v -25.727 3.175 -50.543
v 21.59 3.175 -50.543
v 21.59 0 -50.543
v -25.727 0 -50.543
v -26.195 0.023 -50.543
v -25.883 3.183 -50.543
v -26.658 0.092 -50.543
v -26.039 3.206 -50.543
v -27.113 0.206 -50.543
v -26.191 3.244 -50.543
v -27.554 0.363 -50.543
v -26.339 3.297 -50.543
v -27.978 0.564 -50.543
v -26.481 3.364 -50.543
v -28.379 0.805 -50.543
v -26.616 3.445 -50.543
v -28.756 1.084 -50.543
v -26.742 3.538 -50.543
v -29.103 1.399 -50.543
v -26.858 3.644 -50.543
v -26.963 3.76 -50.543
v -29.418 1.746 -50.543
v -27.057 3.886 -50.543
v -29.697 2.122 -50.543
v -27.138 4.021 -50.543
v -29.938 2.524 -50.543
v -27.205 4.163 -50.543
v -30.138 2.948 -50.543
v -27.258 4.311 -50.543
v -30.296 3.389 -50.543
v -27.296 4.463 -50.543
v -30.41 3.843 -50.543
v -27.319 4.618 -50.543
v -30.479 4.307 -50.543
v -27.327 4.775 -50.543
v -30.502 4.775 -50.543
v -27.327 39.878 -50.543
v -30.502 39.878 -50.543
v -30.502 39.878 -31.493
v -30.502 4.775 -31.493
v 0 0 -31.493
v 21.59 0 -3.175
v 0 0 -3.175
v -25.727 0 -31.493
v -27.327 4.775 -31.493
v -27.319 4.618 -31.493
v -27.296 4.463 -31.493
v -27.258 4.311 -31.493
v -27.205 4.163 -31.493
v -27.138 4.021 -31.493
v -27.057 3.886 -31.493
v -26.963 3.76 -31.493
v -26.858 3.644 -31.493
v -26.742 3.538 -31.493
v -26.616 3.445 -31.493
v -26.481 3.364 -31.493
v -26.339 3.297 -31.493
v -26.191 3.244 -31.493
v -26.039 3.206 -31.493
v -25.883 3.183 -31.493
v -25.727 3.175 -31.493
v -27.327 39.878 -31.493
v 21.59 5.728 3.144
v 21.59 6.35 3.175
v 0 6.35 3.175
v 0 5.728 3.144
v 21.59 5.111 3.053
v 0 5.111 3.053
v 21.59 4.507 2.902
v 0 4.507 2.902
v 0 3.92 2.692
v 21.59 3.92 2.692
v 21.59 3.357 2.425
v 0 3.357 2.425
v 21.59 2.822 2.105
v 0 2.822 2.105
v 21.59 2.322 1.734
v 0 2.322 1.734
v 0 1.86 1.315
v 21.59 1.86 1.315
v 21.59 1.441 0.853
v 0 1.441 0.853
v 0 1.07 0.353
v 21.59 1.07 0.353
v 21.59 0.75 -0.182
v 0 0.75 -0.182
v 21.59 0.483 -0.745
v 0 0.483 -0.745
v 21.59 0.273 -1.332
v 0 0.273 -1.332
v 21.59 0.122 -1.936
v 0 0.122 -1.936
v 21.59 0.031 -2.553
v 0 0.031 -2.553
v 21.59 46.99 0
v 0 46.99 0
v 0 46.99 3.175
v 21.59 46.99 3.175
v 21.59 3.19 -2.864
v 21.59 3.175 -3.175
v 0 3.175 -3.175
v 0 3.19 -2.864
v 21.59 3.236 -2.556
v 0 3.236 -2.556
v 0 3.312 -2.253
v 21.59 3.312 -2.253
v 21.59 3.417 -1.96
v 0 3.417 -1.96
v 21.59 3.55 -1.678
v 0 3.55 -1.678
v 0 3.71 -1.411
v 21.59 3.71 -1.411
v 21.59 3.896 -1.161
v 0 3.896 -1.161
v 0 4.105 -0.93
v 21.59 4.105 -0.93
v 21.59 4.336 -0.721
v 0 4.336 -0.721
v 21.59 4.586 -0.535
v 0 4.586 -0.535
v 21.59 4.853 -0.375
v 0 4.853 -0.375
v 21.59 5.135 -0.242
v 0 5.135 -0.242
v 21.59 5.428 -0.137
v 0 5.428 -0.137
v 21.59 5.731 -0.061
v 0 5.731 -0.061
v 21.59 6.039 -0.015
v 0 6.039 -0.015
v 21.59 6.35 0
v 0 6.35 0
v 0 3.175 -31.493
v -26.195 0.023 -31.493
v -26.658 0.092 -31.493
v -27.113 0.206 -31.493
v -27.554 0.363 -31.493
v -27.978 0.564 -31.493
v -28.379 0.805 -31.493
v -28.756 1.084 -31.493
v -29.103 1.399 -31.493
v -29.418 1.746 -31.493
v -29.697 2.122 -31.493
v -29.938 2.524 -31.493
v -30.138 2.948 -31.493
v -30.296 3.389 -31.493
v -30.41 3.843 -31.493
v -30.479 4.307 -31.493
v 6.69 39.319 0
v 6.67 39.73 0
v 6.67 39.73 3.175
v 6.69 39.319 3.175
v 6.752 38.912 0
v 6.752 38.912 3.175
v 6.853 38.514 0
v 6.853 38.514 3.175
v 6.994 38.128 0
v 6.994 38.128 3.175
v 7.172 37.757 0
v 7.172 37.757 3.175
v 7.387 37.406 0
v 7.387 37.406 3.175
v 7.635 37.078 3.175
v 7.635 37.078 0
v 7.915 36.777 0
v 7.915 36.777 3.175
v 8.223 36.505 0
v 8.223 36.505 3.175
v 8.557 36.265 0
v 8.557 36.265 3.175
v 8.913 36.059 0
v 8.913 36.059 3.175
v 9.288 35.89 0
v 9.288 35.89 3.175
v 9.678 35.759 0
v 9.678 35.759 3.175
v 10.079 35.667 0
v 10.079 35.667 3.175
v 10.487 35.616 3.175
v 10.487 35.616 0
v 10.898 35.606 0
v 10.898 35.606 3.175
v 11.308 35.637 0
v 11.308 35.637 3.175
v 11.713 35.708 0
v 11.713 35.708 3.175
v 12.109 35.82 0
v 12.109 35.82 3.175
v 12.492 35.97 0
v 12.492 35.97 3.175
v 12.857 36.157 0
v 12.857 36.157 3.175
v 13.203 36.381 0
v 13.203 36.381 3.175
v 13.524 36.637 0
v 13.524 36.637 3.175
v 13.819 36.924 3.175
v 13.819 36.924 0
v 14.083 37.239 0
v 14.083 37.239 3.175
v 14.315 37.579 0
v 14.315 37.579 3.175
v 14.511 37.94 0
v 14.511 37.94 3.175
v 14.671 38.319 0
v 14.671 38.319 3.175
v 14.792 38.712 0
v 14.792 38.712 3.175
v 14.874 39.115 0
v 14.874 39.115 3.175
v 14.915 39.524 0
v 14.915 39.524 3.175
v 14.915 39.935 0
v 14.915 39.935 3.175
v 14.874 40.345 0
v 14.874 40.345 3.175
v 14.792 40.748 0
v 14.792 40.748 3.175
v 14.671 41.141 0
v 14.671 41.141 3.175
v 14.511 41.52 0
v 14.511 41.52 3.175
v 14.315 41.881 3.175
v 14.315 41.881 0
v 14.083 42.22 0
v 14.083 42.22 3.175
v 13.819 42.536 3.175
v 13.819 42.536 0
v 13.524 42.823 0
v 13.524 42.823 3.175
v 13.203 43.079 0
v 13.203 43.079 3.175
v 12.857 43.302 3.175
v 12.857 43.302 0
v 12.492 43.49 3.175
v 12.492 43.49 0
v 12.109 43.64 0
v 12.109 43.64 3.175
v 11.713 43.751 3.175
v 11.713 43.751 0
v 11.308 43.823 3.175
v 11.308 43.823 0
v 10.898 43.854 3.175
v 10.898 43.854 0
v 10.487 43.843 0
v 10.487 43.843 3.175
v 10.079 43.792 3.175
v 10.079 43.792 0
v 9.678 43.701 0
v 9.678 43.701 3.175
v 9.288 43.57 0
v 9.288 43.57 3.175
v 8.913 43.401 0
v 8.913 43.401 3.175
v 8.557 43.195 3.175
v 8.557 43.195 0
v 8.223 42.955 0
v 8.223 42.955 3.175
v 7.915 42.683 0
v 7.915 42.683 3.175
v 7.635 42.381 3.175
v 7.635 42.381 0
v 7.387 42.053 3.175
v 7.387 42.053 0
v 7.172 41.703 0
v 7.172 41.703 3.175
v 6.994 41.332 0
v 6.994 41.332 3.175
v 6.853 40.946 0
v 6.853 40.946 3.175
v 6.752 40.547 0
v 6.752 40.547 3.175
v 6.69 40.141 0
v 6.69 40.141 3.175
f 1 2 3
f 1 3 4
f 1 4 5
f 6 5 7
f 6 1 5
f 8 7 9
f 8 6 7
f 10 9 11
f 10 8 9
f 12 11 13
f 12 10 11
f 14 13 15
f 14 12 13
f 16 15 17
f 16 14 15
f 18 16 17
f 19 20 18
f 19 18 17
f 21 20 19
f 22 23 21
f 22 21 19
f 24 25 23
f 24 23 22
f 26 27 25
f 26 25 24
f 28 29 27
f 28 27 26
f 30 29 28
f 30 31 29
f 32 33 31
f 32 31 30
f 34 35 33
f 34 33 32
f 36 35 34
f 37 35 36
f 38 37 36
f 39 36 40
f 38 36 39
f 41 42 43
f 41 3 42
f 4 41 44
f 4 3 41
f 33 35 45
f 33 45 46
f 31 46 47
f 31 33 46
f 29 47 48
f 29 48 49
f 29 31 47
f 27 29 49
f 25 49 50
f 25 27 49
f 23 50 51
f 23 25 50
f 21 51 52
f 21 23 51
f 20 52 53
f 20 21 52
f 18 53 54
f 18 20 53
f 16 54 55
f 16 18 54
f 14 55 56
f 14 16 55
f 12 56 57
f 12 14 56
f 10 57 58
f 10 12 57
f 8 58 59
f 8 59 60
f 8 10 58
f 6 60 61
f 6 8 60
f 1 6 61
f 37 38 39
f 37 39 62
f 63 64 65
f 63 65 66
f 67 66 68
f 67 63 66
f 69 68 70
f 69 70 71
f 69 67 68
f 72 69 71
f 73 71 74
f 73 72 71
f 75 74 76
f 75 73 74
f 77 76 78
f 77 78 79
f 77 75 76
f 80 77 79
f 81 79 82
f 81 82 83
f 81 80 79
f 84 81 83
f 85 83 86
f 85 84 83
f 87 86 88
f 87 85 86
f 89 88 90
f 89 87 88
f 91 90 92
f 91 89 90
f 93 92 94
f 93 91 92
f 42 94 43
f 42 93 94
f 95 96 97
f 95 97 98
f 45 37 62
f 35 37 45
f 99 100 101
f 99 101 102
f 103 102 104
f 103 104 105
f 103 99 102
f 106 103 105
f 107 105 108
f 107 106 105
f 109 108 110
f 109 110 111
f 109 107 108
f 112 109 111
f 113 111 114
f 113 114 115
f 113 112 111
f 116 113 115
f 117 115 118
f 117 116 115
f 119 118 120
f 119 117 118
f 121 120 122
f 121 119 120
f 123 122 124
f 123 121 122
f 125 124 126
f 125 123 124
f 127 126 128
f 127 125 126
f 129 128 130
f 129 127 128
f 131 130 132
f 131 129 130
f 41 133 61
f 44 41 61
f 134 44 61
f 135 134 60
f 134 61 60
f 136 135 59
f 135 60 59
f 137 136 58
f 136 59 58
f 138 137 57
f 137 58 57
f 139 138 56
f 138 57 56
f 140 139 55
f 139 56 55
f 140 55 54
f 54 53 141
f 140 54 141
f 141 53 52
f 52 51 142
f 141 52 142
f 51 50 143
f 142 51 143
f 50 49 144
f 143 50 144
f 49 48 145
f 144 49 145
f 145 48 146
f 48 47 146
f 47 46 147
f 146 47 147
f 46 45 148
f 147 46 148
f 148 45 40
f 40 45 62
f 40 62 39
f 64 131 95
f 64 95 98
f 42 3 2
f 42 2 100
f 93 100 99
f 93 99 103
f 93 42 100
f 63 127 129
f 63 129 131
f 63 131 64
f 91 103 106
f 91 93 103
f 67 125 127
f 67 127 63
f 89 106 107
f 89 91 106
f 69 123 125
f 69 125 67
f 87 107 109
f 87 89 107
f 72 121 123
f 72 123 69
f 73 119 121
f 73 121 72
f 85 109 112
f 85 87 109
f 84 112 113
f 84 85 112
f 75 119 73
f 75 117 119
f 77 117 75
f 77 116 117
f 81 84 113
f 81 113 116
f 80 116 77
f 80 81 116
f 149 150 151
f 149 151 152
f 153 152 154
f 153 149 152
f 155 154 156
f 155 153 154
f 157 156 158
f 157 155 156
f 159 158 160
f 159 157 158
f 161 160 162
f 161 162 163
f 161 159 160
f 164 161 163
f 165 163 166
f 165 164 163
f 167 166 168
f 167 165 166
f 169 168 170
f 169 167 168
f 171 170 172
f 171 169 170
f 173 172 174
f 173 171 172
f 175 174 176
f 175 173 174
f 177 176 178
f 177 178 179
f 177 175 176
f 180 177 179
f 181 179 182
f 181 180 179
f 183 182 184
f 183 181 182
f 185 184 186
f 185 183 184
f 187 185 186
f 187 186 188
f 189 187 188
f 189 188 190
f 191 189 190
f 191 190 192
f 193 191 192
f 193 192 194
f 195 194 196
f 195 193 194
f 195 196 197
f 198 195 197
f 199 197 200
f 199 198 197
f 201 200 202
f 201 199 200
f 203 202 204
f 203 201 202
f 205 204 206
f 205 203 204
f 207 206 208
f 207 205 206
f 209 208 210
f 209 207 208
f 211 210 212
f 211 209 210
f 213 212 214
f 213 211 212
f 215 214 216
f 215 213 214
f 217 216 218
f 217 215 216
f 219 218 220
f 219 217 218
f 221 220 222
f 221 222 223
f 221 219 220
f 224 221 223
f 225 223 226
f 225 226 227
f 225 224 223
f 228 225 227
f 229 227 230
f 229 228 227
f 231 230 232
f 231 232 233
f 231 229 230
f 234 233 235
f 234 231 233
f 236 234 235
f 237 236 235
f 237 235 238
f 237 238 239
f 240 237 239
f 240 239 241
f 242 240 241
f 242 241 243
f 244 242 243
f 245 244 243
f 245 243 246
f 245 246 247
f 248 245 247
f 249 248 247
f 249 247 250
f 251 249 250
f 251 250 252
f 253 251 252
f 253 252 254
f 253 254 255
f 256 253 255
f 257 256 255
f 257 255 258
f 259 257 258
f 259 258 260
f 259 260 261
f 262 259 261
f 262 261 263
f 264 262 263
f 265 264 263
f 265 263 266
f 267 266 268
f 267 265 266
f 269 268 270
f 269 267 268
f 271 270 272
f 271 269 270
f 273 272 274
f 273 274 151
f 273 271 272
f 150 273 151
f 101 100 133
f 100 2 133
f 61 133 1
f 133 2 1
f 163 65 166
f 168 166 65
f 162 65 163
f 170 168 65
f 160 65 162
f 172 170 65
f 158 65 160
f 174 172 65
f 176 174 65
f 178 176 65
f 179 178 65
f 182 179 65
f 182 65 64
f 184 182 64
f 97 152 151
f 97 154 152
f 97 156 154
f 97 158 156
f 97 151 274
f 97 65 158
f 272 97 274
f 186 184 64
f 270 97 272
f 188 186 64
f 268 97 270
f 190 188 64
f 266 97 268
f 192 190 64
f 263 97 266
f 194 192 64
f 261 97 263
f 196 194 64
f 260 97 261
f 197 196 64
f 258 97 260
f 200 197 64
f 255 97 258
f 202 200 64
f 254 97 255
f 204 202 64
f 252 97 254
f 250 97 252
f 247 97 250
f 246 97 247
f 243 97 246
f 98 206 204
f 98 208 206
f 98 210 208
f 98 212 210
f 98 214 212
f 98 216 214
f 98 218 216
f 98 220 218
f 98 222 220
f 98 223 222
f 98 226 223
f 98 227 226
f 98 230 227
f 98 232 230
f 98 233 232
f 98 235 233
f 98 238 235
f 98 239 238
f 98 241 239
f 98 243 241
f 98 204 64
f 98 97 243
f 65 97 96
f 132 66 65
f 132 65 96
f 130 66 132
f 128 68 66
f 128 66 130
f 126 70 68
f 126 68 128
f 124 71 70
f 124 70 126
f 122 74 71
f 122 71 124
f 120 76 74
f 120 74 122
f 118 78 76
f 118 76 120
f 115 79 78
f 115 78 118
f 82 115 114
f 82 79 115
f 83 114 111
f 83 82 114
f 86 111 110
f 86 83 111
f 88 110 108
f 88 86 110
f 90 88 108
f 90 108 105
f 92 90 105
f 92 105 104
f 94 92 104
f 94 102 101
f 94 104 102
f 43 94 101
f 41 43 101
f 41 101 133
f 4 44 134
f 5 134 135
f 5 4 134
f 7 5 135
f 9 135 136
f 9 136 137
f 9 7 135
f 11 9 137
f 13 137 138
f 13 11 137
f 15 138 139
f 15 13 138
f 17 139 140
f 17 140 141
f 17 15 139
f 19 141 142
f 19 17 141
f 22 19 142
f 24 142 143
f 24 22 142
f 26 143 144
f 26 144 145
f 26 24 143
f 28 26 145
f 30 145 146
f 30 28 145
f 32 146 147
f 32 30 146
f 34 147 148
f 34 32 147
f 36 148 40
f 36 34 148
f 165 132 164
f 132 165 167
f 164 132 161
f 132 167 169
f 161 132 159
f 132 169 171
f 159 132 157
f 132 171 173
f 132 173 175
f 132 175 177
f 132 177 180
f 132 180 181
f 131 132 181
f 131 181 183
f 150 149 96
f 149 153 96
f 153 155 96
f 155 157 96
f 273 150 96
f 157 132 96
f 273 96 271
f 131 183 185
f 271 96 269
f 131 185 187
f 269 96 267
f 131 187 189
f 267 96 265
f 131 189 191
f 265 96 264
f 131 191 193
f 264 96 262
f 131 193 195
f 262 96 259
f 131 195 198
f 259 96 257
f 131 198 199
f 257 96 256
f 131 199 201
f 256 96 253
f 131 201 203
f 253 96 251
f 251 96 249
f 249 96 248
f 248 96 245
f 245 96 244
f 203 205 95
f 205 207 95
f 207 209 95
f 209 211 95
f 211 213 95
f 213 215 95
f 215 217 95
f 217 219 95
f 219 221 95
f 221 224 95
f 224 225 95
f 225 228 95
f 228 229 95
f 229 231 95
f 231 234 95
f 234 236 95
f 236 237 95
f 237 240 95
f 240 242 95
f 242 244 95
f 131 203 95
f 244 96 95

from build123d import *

# Parameters (mm, degrees)
SKETCH1_W                    = 21.59
SKETCH1_H                    = 46.99
SKETCH1_R                    = 4.124999878
BOSS_EXTRUDE1_DEPTH          = 3.175
EDGE_FLANGE2_STRIP_W         = 19.05
EDGE_FLANGE2_STRIP_H         = 3.175
EDGE_FLANGE2_STRIP_CUT_DEPTH = 21.59
EDGE_FLANGE2_DEPTH           = 21.59
EDGE_FLANGE2_FLAT_DEPTH      = 3.175
EDGE_FLANGE3_STRIP_W         = 15.900000204
EDGE_FLANGE3_STRIP_H         = 3.175
EDGE_FLANGE3_STRIP_CUT_DEPTH = 19.05
EDGE_FLANGE3_DEPTH           = 19.05


# Sheet-metal steps are written as plain solids
with BuildPart() as part:
    # Sketch1 → Boss-Extrude1 (new body)
    with BuildSketch(Plane.XY):
        with Locations((10.795, 23.495)):
            Rectangle(SKETCH1_W, SKETCH1_H)
        with Locations(Location((10.795, 39.729801599, 0), (0, 0, 180))):
            Circle(SKETCH1_R, mode=Mode.SUBTRACT)
    extrude(amount=BOSS_EXTRUDE1_DEPTH)

    # Edge-Flange2 strip (across the edge) → Edge-Flange2 strip cut (cut)
    with BuildSketch(Plane(origin=(21.59, 0, 0), x_dir=(0, 1, 0), z_dir=(-1, 0, 0))):
        with Locations((-3.175, -1.5875)):
            Rectangle(EDGE_FLANGE2_STRIP_W, EDGE_FLANGE2_STRIP_H)
    extrude(amount=EDGE_FLANGE2_STRIP_CUT_DEPTH, mode=Mode.SUBTRACT)

    # Edge-Flange2 bend section (across the edge) → Edge-Flange2 (add)
    with BuildSketch(Plane(origin=(21.59, 0, 0), x_dir=(0, 1, 0), z_dir=(-1, 0, 0))):
        with BuildLine():
            Line((0, 3.175), (3.175, 3.175))
            ThreePointArc((3.175, 3.175), (4.10493597, 0.92993597), (6.35, 0))
            Line((6.35, 0), (6.35, -3.175))
            ThreePointArc((6.35, -3.175), (1.859871939, -1.315128061), (0, 3.175))
        make_face()
    extrude(amount=EDGE_FLANGE2_DEPTH)

    # Edge-Flange2 profile (on flange) → Edge-Flange2 flat (add)
    with BuildSketch(Plane(origin=(0, 0, 0), x_dir=(-1, 0, 0), z_dir=(0, -1, 0))):
        Polygon((0, 3.175), (0, 31.493260102), (27.326645128, 31.493260102), (27.326645128, 50.543260102), (0, 50.543260102), (-21.59, 50.543260102), (-21.59, 3.175), align=None)
    extrude(amount=-EDGE_FLANGE2_FLAT_DEPTH)

    # Edge-Flange3 strip (across the edge) → Edge-Flange3 strip cut (cut)
    with BuildSketch(Plane(origin=(-27.326645128, 3.175, -50.543260102), x_dir=(1, 0, 0), z_dir=(0, 0, 1))):
        with Locations((-6.35, -1.5875)):
            Rectangle(EDGE_FLANGE3_STRIP_W, EDGE_FLANGE3_STRIP_H)
    extrude(amount=EDGE_FLANGE3_STRIP_CUT_DEPTH, mode=Mode.SUBTRACT)

    # Edge-Flange3 section (across the edge) → Edge-Flange3 (add)
    with BuildSketch(Plane(origin=(-27.326645128, 3.175, -50.543260102), x_dir=(1, 0, 0), z_dir=(0, 0, 1))):
        with BuildLine():
            Line((-3.175, 1.600000102), (-3.175, 36.703))
            Line((-3.175, 36.703), (0, 36.703))
            Line((0, 36.703), (0, 1.600000102))
            ThreePointArc((0, 1.600000102), (0.46862918, 0.46862918), (1.600000102, 0))
            Line((1.600000102, 0), (1.600000102, -3.175))
            ThreePointArc((1.600000102, -3.175), (-1.77643485, -1.77643485), (-3.175, 1.600000102))
        make_face()
    extrude(amount=EDGE_FLANGE3_DEPTH)


solid = part.part
